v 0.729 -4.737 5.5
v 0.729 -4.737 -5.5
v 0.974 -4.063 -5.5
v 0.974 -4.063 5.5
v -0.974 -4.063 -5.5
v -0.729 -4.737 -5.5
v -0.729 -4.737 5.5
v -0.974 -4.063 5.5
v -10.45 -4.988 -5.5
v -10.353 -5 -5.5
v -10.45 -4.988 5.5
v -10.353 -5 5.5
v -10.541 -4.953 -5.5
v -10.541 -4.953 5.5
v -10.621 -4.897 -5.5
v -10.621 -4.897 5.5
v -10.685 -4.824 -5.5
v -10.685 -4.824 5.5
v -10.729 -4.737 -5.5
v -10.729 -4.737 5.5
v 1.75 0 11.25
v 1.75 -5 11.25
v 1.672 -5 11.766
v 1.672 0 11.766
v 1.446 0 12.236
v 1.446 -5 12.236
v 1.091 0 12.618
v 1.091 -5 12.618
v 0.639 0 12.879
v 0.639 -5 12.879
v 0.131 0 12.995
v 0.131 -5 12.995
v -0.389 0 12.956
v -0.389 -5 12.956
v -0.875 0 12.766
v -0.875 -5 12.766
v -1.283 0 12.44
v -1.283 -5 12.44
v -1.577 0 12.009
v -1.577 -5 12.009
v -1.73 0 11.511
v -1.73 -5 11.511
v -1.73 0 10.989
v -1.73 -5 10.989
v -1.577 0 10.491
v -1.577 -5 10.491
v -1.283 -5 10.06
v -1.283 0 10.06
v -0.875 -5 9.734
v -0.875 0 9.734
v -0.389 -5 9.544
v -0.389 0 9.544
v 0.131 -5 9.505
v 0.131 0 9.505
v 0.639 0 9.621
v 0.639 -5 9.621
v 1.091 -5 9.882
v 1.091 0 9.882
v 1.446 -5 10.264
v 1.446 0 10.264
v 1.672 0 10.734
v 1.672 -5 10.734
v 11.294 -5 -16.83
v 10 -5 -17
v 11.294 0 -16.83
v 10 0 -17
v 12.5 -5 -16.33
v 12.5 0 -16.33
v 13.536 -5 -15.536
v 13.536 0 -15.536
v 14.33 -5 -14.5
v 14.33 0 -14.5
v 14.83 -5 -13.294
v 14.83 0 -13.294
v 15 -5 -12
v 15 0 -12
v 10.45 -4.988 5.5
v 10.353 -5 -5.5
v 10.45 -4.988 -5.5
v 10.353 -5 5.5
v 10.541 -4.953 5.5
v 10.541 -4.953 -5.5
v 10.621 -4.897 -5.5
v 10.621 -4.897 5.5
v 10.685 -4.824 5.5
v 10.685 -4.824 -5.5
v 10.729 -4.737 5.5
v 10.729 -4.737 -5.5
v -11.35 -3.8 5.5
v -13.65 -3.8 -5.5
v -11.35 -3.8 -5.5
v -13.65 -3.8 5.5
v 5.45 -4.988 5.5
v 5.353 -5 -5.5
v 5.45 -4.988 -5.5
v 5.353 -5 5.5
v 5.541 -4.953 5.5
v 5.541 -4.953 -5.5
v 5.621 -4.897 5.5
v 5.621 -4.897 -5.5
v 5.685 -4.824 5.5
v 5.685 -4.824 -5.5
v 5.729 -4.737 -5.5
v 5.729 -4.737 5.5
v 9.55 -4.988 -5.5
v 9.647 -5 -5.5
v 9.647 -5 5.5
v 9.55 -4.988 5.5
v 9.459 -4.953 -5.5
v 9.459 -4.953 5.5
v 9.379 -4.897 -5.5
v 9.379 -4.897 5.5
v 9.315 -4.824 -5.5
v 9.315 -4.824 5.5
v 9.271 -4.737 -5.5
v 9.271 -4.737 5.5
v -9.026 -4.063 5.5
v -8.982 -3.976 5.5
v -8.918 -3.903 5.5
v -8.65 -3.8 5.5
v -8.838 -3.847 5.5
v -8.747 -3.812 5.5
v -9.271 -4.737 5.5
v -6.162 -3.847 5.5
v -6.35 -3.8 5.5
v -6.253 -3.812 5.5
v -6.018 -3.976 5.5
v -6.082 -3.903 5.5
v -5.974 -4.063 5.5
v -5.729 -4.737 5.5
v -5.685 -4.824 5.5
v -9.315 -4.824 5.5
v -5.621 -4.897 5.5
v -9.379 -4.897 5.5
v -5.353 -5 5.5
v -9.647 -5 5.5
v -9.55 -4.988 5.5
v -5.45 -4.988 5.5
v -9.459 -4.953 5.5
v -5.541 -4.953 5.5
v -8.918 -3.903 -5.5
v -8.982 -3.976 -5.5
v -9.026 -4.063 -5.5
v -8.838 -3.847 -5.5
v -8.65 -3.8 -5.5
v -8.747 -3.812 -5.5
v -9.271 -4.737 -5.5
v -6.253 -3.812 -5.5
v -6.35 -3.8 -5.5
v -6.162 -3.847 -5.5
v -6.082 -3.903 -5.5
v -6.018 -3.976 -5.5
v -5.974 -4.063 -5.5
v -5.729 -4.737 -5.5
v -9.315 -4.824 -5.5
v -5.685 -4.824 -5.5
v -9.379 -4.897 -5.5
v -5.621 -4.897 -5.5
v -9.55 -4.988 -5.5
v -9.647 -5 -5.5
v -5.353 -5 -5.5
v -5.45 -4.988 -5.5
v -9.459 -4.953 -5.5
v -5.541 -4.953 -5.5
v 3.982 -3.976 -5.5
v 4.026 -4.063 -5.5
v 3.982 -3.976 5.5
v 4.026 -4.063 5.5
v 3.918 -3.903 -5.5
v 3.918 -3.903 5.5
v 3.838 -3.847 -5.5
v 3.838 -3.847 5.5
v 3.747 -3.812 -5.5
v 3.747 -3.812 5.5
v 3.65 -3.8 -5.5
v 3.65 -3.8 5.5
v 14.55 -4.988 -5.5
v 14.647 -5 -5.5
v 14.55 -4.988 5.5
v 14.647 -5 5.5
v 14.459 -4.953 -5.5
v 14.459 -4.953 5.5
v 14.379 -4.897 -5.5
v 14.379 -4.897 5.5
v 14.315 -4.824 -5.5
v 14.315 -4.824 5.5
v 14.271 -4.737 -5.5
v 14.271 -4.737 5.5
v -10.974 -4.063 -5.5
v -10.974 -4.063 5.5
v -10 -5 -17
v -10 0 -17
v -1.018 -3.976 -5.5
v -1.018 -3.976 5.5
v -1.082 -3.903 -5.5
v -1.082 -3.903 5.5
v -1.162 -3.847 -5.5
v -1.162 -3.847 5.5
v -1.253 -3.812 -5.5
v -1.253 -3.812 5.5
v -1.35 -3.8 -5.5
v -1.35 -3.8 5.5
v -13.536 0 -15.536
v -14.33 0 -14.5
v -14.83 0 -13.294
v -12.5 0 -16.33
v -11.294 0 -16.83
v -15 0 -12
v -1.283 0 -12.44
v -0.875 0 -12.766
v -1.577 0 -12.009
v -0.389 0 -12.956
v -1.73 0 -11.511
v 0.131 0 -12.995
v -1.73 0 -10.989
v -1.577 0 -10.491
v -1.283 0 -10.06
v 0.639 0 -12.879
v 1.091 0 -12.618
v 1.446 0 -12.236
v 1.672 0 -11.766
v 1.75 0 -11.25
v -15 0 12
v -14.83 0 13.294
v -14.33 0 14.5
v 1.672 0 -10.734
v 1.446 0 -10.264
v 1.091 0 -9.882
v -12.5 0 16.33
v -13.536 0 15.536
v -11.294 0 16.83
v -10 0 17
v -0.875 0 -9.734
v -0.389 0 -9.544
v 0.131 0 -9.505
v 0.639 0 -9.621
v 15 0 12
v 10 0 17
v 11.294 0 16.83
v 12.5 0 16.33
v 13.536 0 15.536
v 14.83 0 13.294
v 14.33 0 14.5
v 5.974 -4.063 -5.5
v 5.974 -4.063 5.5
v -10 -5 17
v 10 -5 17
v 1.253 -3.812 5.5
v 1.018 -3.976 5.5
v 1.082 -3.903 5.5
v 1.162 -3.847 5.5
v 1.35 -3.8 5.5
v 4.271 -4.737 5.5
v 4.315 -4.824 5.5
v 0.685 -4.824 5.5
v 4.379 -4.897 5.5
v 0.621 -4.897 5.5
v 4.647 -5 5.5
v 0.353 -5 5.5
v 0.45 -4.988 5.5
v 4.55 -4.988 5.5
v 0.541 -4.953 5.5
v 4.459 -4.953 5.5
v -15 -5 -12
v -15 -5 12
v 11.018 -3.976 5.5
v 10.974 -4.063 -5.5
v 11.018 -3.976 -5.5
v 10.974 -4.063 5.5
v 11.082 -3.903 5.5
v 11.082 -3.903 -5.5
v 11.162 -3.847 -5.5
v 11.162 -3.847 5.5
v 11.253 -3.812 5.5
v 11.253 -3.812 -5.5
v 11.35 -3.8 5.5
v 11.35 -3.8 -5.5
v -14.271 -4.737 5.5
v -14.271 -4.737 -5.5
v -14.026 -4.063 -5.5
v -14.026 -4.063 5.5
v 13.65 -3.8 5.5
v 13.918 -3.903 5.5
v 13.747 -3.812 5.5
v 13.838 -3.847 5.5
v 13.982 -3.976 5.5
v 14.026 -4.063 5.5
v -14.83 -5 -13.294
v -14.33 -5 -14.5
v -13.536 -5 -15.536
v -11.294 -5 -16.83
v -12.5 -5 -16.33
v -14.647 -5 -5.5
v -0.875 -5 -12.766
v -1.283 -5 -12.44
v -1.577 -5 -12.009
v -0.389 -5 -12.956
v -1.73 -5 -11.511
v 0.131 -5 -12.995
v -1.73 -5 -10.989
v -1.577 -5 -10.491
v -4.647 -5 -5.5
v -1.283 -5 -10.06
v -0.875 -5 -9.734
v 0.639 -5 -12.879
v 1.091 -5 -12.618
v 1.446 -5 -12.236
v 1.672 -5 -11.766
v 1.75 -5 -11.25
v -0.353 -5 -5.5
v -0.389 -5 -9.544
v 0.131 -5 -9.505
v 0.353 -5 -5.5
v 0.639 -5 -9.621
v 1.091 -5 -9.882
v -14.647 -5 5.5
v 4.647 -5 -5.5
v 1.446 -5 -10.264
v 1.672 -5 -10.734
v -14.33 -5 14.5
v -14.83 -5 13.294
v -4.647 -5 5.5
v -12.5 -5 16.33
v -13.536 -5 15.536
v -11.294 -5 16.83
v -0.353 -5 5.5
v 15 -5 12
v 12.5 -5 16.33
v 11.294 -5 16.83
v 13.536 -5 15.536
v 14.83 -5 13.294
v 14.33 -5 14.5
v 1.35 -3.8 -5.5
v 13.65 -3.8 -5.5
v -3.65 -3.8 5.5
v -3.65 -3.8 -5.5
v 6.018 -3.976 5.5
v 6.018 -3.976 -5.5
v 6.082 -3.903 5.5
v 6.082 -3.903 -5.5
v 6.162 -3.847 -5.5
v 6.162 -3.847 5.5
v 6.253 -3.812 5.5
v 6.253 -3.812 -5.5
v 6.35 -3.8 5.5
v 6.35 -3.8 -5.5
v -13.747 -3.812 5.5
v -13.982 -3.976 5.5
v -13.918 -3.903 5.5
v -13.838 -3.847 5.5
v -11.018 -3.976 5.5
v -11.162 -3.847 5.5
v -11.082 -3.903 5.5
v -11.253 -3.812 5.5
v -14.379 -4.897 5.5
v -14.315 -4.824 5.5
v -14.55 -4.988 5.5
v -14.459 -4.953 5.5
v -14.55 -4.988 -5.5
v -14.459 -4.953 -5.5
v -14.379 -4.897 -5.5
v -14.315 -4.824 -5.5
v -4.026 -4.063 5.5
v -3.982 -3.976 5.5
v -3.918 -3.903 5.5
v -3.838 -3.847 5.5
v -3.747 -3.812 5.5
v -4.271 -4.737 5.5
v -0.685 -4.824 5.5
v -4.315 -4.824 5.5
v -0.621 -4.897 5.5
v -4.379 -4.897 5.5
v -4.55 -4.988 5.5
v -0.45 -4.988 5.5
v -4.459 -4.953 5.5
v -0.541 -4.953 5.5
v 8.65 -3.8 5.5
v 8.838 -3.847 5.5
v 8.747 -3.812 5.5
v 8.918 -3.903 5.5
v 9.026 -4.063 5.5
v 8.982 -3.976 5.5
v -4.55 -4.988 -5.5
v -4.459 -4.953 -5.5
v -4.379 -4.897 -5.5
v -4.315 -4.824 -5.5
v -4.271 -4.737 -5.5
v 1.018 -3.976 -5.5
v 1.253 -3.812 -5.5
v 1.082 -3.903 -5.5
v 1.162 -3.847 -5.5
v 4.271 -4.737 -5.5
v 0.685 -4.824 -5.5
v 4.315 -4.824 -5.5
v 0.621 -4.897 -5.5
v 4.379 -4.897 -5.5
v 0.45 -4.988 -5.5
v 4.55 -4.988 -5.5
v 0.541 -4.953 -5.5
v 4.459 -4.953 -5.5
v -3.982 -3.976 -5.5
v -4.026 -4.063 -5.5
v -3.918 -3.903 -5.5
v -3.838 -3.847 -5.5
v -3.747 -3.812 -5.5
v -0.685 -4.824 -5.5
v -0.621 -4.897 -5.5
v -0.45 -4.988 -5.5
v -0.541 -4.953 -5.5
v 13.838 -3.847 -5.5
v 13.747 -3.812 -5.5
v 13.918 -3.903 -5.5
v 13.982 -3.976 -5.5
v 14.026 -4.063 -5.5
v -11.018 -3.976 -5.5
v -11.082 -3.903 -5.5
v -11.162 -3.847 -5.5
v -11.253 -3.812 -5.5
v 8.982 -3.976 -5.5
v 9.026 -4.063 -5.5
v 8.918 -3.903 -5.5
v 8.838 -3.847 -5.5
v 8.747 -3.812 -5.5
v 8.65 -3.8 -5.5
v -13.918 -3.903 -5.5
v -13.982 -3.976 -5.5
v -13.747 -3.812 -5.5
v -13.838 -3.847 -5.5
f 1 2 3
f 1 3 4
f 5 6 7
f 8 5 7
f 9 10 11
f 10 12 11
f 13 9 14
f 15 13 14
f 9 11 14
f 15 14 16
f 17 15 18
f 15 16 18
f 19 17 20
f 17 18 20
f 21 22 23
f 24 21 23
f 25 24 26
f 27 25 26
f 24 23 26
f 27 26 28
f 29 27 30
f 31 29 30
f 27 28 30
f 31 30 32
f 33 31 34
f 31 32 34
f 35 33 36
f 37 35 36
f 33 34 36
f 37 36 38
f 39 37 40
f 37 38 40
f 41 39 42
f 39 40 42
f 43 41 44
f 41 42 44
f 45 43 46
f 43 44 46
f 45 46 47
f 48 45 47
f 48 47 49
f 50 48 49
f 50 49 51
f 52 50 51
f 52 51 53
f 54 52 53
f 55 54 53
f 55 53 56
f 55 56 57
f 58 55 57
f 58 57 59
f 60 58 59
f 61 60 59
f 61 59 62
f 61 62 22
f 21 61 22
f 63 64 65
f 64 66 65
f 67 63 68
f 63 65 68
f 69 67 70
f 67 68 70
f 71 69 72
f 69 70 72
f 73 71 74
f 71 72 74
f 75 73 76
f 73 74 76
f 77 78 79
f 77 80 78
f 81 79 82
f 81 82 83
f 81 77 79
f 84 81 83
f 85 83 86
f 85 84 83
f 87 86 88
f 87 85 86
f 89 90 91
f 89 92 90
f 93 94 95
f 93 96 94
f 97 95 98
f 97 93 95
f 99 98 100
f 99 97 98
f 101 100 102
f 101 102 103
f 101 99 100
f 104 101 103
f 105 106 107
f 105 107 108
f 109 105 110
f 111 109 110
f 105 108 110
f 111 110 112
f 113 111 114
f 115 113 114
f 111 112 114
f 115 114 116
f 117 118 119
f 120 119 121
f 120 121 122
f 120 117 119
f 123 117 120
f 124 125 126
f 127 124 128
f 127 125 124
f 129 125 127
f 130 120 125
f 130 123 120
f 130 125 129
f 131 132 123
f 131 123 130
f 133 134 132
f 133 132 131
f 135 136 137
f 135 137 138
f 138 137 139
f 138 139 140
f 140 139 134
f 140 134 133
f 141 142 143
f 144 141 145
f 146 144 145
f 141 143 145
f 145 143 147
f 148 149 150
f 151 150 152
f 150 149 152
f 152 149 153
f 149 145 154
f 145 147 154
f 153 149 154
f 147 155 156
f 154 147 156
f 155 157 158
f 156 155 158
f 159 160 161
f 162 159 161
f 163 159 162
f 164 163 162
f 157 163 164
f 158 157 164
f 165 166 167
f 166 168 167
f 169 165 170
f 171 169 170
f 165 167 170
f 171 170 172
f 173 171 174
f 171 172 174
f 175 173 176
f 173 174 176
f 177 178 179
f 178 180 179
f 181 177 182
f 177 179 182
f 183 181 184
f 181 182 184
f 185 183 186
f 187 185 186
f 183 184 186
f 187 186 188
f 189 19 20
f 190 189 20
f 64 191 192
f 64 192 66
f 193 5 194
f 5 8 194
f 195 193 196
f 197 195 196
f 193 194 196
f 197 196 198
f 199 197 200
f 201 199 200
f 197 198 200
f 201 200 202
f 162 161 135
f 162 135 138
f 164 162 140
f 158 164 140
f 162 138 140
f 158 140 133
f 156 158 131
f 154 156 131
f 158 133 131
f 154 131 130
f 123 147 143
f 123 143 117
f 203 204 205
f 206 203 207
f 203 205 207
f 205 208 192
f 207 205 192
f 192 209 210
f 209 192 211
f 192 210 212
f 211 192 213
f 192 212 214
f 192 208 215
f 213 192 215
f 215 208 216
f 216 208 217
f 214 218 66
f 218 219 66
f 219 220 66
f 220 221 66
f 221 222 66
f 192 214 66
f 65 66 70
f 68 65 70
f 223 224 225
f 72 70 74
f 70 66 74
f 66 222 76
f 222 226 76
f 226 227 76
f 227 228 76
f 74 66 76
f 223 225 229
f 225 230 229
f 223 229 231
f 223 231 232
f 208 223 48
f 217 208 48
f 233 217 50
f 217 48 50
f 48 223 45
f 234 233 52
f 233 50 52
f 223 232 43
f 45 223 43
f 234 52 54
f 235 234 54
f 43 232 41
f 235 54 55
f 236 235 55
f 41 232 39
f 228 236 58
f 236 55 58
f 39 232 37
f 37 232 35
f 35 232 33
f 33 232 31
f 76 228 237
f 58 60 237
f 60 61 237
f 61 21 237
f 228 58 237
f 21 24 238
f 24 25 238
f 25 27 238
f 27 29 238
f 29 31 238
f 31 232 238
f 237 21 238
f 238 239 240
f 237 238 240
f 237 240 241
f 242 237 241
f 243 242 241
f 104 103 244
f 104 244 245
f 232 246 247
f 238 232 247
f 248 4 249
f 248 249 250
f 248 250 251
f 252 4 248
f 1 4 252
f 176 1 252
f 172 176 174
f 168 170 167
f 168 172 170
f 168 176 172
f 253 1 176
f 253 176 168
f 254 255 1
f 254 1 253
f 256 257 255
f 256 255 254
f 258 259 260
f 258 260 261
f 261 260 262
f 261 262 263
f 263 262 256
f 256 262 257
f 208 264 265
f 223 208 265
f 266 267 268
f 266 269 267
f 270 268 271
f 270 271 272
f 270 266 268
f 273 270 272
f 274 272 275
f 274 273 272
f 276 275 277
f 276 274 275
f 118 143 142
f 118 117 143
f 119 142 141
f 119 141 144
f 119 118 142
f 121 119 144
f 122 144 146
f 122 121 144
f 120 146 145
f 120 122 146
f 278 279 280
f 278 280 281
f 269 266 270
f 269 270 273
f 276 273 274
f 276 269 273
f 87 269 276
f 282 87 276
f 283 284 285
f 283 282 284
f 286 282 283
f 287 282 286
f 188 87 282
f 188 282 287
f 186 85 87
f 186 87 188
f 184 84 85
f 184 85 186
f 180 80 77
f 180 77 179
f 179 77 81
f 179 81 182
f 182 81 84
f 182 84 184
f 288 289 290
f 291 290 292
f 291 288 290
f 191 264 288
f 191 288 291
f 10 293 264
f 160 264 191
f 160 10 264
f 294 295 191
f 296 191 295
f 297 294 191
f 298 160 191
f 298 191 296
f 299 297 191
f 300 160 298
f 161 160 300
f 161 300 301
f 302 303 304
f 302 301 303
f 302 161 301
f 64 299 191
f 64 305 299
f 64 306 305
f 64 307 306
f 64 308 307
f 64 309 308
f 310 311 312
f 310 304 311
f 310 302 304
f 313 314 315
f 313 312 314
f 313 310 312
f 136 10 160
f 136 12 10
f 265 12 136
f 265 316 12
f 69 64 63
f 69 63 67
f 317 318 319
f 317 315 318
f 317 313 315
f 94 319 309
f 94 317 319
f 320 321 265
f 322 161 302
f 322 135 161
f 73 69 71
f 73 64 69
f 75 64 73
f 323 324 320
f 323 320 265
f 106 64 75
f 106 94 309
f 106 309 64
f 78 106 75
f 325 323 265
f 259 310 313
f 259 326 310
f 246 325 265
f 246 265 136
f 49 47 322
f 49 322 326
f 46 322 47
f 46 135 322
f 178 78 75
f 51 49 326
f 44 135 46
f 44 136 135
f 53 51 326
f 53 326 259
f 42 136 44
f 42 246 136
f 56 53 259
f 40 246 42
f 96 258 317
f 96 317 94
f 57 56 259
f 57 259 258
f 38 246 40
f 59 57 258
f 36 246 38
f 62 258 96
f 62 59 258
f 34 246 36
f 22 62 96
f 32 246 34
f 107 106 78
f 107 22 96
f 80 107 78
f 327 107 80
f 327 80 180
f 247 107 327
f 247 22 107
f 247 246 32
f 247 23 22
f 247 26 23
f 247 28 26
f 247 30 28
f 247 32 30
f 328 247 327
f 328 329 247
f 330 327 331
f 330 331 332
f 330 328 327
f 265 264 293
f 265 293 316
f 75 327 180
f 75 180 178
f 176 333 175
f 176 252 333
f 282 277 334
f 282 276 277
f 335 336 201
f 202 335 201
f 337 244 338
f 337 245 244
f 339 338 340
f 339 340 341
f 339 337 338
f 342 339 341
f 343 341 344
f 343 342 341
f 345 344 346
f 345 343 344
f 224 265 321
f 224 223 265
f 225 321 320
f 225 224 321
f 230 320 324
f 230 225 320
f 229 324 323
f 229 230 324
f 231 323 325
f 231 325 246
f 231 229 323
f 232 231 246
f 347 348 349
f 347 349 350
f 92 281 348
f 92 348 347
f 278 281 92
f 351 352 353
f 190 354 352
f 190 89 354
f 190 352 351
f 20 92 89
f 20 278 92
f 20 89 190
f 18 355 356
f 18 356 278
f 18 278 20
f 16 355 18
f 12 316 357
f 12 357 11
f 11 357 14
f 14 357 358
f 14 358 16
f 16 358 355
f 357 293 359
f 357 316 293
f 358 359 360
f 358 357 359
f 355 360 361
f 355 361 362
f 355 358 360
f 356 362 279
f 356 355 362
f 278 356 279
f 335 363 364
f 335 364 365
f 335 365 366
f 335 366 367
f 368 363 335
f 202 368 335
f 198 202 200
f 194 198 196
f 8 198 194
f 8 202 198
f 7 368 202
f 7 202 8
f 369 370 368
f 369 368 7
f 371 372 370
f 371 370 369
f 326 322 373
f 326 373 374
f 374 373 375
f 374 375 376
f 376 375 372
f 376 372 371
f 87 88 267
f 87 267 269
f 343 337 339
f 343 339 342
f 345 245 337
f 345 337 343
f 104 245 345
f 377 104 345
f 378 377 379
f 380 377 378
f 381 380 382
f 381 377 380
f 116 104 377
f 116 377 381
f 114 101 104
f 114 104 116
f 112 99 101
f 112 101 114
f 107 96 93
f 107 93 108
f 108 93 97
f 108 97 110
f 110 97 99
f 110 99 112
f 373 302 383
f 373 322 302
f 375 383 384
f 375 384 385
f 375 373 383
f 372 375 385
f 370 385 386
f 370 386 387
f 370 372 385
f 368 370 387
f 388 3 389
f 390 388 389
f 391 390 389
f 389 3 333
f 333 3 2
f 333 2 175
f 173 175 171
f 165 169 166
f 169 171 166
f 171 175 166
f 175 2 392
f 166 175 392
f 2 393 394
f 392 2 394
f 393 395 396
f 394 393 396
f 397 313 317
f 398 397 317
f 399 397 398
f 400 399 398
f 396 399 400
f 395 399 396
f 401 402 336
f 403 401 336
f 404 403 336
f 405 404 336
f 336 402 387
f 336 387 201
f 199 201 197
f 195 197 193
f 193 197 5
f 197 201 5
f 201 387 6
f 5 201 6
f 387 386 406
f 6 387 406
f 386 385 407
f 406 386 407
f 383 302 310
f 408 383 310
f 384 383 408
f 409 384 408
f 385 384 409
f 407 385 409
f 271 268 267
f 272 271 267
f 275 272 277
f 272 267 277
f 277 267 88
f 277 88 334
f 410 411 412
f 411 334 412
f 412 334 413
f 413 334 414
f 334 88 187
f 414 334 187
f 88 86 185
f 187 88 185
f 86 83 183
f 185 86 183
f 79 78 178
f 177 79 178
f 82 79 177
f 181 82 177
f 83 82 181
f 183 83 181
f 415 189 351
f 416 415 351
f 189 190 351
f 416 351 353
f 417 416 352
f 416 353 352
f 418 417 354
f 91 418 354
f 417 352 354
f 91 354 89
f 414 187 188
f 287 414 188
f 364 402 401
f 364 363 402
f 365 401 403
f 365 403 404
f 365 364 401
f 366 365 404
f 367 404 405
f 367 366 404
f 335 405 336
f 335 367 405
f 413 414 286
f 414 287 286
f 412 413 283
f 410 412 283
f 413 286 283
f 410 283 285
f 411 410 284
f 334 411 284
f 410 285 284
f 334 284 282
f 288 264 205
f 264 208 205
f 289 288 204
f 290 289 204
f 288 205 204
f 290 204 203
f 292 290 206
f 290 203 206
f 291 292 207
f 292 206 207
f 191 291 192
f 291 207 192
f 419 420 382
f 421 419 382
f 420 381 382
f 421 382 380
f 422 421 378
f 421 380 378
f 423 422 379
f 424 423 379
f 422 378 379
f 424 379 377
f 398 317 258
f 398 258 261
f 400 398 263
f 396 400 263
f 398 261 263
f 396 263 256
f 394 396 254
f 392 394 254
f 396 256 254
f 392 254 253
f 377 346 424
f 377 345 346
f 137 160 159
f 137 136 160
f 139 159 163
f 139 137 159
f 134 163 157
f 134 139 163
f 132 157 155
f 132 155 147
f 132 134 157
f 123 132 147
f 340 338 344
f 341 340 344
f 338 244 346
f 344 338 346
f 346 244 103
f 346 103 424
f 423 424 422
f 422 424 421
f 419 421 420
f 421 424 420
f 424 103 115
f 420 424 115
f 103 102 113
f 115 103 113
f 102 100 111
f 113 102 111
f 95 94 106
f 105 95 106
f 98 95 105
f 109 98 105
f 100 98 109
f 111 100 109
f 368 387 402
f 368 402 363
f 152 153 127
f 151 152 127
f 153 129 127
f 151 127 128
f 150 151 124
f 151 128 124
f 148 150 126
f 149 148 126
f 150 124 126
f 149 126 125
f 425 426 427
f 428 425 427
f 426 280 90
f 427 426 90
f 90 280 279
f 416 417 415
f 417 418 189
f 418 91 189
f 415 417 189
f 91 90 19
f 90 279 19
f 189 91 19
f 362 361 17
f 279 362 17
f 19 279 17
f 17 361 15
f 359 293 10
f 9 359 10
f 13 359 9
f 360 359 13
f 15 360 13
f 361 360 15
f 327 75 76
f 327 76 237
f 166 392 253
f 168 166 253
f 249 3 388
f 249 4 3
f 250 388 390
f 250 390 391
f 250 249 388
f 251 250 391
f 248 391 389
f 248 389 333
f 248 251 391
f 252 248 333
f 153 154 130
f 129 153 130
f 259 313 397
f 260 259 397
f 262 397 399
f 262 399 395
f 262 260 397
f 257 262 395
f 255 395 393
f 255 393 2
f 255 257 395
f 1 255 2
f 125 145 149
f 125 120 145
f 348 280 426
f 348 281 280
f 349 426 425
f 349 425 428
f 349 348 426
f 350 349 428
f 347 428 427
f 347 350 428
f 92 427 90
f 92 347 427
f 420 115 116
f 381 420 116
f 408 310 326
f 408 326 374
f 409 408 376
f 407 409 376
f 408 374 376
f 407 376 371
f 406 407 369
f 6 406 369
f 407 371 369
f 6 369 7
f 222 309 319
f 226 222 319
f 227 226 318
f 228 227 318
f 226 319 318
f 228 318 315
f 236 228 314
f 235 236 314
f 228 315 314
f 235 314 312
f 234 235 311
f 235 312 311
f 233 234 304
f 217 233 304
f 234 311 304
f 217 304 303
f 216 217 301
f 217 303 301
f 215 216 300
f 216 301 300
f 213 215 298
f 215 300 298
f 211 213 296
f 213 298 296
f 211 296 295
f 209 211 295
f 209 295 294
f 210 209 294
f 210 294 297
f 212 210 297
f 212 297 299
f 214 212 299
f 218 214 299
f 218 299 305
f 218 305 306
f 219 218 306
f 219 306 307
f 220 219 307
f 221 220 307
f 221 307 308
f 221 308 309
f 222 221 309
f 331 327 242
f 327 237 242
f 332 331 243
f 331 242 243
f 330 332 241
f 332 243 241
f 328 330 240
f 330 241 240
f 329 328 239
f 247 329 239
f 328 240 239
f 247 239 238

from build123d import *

# Parameters (mm, degrees)
SKETCH1_W           = 30
SKETCH1_H           = 34
BOSS_EXTRUDE1_DEPTH = 5
FILLET2_R           = 5
SKETCH10_R          = 1.75
CUT_EXTRUDE7_DEPTH  = 6
SKETCH11_W          = 3.733694592
SKETCH11_H          = 11
CUT_EXTRUDE8_DEPTH  = 1.2
DRAFT1_ANGLE        = 20
FILLET3_R           = 0.4


with BuildPart() as part:
    # Sketch1 → Boss-Extrude1 (new body)
    with BuildSketch(Plane.XZ.offset(5)):
        Rectangle(SKETCH1_W, SKETCH1_H)
    extrude(amount=-BOSS_EXTRUDE1_DEPTH)

    # Fillet2
    fillet2_edges = [part.edges().sort_by_distance(p)[0] for p in [
        (15, -2.5, 17),
        (15, -2.5, -17),
        (-15, -2.5, -17),
        (-15, -2.5, 17),
    ]]
    fillet(fillet2_edges, radius=FILLET2_R)

    # Sketch10 → Cut-Extrude7 (cut, through all)
    with BuildSketch(Plane.XZ.offset(5)):
        with Locations((0, 11.25)):
            Circle(SKETCH10_R)
        with Locations((0, -11.25)):
            Circle(SKETCH10_R)
    extrude(amount=-CUT_EXTRUDE7_DEPTH, mode=Mode.SUBTRACT)

    # Sketch11 → Cut-Extrude8 (cut)
    with BuildSketch(Plane.XZ.offset(5)):
        with Locations((-12.5, 0)):
            Rectangle(SKETCH11_W, SKETCH11_H)
        with Locations((-7.5, 0)):
            Rectangle(SKETCH11_W, SKETCH11_H)
        with Locations((-2.5, 0)):
            Rectangle(SKETCH11_W, SKETCH11_H)
        with Locations((2.5, 0)):
            Rectangle(SKETCH11_W, SKETCH11_H)
        with Locations((7.5, 0)):
            Rectangle(SKETCH11_W, SKETCH11_H)
        with Locations((12.5, 0)):
            Rectangle(SKETCH11_W, SKETCH11_H)
    extrude(amount=-CUT_EXTRUDE8_DEPTH, mode=Mode.SUBTRACT)

    # Draft1
    draft1_faces = [part.faces().sort_by_distance(p)[0] for p in [
        (10.633152704, -4.4, 0),
        (5.633152704, -4.4, 0),
        (0.633152704, -4.4, 0),
        (-4.366847296, -4.4, 0),
        (-9.366847296, -4.4, 0),
        (-14.366847296, -4.4, 0),
        (14.366847296, -4.4, 0),
        (9.366847296, -4.4, 0),
        (4.366847296, -4.4, 0),
        (-0.633152704, -4.4, 0),
        (-5.633152704, -4.4, 0),
        (-10.633152704, -4.4, 0),
    ]]
    draft(draft1_faces, Plane(origin=(0, -5, 0), x_dir=(0, 0, -1), z_dir=(0, -1, 0)), DRAFT1_ANGLE)

    # Fillet3
    fillet3_edges = [part.edges().sort_by_distance(p)[0] for p in [
        (-13.930083015, -3.8, 0),
        (-11.069916985, -3.8, 0),
        (-14.366847296, -5, 0),
        (-10.633152704, -5, 0),
        (-8.930083015, -3.8, 0),
        (-6.069916985, -3.8, 0),
        (-9.366847296, -5, 0),
        (-5.633152704, -5, 0),
        (-3.930083015, -3.8, 0),
        (-1.069916985, -3.8, 0),
        (-4.366847296, -5, 0),
        (-0.633152704, -5, 0),
        (1.069916985, -3.8, 0),
        (3.930083015, -3.8, 0),
        (0.633152704, -5, 0),
        (4.366847296, -5, 0),
        (6.069916985, -3.8, 0),
        (8.930083015, -3.8, 0),
        (5.633152704, -5, 0),
        (9.366847296, -5, 0),
        (11.069916985, -3.8, 0),
        (13.930083015, -3.8, 0),
        (10.633152704, -5, 0),
        (14.366847296, -5, 0),
    ]]
    fillet(fillet3_edges, radius=FILLET3_R)


solid = part.part
